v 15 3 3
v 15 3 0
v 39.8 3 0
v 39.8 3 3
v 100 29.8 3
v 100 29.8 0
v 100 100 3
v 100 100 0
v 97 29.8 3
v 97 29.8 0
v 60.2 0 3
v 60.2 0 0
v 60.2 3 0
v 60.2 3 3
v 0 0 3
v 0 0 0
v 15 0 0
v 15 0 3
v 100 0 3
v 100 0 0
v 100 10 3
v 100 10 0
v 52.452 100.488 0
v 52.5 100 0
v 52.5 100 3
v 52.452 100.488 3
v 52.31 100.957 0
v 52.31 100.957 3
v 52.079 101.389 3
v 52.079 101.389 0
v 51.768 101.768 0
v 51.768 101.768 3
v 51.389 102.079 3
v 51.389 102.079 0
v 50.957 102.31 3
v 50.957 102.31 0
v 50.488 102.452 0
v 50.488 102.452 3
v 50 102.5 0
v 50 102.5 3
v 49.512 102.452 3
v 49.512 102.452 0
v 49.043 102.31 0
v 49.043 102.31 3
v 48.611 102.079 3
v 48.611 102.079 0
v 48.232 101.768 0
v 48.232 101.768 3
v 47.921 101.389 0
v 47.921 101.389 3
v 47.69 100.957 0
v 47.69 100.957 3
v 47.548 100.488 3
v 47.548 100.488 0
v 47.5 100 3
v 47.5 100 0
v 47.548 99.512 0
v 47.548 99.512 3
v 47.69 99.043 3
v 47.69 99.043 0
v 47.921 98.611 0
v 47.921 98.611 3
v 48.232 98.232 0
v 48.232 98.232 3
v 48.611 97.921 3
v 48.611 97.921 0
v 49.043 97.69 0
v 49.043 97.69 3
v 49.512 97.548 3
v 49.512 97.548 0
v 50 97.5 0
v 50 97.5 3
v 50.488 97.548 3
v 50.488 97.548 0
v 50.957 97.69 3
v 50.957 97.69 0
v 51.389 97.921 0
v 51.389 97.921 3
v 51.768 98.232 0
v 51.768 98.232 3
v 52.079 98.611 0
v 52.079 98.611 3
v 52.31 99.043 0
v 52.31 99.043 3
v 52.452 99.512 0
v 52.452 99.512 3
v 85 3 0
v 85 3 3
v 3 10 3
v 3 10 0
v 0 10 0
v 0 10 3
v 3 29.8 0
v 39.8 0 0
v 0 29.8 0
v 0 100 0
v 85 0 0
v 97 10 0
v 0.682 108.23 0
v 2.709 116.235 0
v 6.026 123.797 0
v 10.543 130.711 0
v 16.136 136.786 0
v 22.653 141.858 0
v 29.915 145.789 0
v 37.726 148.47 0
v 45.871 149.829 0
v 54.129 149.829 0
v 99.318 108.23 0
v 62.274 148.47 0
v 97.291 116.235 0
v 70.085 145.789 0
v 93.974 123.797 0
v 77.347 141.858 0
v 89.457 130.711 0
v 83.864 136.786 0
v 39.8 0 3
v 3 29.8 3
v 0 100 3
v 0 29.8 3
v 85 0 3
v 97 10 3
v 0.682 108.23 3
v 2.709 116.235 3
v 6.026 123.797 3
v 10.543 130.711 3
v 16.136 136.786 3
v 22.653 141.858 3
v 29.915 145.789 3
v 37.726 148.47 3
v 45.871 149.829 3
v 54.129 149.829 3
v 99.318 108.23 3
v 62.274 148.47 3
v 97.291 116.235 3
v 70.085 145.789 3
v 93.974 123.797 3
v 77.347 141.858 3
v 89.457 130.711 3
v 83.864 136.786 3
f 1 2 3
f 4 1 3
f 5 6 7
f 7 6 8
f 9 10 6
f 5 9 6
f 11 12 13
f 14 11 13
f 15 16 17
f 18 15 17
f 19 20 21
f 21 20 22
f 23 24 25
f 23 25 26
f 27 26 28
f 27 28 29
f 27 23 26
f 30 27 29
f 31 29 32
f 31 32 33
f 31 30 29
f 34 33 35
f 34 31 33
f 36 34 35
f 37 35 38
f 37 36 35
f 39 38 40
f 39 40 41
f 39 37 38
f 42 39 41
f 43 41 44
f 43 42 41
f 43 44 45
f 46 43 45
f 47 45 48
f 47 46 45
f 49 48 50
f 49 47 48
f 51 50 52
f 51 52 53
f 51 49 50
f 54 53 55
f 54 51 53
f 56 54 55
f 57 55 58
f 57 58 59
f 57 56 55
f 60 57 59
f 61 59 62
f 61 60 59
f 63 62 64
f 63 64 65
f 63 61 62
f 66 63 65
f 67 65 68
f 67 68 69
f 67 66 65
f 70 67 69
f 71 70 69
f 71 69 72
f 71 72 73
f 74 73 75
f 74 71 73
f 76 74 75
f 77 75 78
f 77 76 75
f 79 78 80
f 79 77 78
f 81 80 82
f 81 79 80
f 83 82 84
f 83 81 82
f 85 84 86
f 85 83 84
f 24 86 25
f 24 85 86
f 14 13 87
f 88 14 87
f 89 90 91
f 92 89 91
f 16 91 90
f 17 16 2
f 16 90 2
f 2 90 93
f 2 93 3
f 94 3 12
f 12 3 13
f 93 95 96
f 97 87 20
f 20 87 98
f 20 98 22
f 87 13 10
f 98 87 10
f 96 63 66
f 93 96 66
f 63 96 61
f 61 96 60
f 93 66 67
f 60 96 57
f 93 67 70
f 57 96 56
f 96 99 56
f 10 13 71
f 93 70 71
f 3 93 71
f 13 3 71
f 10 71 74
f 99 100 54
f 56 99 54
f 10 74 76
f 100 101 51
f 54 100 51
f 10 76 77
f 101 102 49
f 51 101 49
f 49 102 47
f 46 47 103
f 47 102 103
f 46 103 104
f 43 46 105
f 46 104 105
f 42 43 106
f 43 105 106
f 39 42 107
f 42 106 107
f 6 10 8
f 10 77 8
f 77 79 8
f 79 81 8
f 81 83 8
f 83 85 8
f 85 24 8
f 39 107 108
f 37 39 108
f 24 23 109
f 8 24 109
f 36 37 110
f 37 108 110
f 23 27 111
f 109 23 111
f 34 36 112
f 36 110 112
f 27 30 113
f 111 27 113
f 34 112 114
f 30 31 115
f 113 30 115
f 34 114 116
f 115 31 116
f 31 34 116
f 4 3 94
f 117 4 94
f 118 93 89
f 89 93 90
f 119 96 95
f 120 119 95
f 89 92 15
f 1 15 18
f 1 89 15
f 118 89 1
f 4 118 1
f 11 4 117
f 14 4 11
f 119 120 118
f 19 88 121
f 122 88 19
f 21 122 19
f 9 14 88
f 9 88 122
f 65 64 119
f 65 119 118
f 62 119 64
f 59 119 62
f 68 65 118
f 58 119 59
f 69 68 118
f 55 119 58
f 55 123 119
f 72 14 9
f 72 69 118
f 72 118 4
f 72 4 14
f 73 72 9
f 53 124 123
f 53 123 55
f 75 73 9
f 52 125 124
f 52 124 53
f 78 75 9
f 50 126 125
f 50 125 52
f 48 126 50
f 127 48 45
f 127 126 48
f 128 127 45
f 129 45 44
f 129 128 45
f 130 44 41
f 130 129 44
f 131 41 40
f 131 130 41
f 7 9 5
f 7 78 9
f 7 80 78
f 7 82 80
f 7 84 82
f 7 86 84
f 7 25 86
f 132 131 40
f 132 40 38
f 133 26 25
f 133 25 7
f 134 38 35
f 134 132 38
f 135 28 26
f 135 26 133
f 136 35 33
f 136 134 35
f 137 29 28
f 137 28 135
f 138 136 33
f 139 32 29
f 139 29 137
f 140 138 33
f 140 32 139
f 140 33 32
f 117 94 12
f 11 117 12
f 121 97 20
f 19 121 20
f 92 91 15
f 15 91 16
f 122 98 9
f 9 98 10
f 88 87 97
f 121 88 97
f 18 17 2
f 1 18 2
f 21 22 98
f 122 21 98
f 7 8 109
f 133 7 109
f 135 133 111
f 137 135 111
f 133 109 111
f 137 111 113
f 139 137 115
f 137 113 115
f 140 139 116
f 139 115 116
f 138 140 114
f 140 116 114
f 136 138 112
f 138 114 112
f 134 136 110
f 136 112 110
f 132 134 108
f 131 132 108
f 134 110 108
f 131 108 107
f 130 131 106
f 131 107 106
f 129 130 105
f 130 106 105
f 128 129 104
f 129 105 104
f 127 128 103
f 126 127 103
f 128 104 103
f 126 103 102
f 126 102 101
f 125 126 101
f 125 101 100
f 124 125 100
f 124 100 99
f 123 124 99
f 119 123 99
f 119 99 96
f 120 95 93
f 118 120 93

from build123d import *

# Parameters (mm, degrees)
SKETCH1_R           = 2.5
BOSS_EXTRUDE1_DEPTH = 3


with BuildPart() as part:
    # Sketch1 → Boss-Extrude1 (new body)
    with BuildSketch(Plane.XY):
        with BuildLine():
            Line((0, 10), (0, 0))
            Line((0, 0), (15, 0))
            Line((15, 0), (15, 3))
            Line((15, 3), (39.8, 3))
            Line((39.8, 3), (39.8, 0))
            Line((39.8, 0), (60.2, 0))
            Line((60.2, 0), (60.2, 3))
            Line((60.2, 3), (85, 3))
            Line((85, 3), (85, 0))
            Line((85, 0), (100, 0))
            Line((100, 0), (100, 10))
            Line((100, 10), (97, 10))
            Line((97, 10), (97, 29.8))
            Line((97, 29.8), (100, 29.8))
            Line((100, 29.8), (100, 100))
            ThreePointArc((100, 100), (50, 150), (0, 100))
            Line((0, 100), (0, 29.8))
            Line((0, 29.8), (3, 29.8))
            Line((3, 29.8), (3, 10))
            Line((3, 10), (0, 10))
        make_face()
        with Locations((50, 100)):
            Circle(SKETCH1_R, mode=Mode.SUBTRACT)
    extrude(amount=BOSS_EXTRUDE1_DEPTH)


solid = part.part
